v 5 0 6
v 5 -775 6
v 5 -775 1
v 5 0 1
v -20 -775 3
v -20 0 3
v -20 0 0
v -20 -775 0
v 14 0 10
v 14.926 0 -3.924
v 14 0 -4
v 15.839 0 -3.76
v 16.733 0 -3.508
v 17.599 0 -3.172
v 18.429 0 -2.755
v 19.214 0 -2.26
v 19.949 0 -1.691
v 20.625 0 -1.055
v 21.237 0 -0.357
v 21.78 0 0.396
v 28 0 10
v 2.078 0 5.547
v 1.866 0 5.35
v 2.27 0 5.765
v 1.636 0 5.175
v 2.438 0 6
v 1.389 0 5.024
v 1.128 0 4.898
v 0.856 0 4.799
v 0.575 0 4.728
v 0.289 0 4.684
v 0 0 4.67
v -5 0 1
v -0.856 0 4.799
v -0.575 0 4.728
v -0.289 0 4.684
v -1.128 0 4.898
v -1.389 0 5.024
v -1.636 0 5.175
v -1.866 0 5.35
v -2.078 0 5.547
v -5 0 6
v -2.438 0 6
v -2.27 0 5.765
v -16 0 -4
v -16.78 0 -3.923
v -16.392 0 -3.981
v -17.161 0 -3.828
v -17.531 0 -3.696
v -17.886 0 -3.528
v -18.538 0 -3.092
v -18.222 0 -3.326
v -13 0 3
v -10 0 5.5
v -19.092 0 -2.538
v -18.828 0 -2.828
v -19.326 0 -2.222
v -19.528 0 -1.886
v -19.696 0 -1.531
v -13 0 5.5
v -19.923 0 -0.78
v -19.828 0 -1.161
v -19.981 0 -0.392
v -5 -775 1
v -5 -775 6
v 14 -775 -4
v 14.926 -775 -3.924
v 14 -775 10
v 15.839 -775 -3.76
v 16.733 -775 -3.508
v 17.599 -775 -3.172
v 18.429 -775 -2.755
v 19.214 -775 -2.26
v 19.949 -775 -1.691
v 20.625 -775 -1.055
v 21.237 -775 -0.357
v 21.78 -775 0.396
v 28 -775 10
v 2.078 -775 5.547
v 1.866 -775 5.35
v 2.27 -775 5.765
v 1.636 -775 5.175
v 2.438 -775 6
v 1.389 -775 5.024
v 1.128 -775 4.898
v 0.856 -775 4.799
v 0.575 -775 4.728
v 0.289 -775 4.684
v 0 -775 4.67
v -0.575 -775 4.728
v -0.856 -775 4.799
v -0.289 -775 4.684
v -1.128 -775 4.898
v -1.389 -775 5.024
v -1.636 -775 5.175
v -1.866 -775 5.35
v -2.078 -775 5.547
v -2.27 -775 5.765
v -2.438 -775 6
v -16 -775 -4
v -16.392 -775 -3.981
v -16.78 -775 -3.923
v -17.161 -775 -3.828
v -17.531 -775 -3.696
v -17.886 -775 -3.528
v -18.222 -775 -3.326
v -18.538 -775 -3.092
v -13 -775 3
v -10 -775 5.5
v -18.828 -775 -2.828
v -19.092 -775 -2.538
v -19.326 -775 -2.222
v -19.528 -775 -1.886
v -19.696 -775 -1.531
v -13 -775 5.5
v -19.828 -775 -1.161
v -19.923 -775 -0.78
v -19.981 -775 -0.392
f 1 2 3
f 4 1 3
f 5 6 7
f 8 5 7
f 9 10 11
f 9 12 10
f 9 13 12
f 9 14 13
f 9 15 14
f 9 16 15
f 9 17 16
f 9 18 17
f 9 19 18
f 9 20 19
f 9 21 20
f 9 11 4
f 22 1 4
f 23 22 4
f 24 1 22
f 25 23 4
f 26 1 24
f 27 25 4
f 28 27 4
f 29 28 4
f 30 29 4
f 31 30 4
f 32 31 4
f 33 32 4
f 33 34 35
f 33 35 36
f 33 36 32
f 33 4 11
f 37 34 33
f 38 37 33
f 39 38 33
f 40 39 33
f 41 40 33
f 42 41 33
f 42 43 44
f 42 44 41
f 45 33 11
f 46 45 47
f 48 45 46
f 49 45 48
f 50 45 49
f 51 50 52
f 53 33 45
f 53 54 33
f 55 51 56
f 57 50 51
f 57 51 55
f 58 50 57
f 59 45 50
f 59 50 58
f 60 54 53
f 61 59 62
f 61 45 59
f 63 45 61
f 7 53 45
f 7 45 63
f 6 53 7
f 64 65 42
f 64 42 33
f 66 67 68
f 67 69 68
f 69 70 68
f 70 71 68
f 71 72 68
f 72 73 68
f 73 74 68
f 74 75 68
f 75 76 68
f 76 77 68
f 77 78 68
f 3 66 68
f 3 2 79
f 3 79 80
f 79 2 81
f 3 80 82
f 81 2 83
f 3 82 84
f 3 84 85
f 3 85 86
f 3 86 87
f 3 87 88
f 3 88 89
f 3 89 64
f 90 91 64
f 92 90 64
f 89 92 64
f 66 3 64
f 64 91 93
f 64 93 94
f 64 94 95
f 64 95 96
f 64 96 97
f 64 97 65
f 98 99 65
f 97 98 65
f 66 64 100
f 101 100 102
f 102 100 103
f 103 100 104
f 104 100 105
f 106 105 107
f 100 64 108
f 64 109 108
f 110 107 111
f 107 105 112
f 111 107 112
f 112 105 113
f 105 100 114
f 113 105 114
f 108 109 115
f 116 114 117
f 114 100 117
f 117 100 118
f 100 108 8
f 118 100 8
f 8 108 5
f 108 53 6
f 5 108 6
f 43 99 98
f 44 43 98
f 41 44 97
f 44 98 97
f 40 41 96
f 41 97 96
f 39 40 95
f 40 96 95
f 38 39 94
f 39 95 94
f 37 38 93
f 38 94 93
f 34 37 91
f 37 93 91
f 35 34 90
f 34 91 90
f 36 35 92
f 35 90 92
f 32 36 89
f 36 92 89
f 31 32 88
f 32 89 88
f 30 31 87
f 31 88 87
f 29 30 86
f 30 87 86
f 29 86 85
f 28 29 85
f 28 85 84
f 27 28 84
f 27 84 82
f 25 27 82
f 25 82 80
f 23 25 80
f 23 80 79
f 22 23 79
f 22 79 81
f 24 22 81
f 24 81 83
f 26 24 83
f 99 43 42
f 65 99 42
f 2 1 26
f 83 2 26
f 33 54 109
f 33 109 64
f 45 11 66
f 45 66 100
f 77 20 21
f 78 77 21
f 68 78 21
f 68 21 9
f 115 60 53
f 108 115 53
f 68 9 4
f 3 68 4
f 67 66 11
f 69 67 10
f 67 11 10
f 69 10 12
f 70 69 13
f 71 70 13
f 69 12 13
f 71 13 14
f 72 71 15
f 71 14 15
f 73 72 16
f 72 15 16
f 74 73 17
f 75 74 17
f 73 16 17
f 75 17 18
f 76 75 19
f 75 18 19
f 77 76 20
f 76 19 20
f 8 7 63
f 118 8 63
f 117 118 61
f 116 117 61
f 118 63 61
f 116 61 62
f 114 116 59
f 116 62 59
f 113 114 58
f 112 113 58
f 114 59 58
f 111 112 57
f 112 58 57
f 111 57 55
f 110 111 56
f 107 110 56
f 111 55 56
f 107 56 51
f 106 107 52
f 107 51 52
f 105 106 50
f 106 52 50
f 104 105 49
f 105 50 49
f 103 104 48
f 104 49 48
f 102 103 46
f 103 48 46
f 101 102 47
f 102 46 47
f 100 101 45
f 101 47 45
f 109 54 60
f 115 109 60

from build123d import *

# Parameters (mm, degrees)
PAD_DEPTH    = 775
POCKET_DEPTH = 800


with BuildPart() as part:
    # Sketch → Pad (new body)
    with BuildSketch(Plane.XZ):
        with BuildLine():
            Line((14, -4), (-16, -4))
            ThreePointArc((-20, 0), (-18.828427, -2.828427), (-16, -4))
            Line((-20, 3), (-20, 0))
            Line((-13, 3), (-20, 3))
            Line((-13, 5.5), (-13, 3))
            Line((-10, 5.5), (-13, 5.5))
            Line((-10, 5.5), (-5, 1))
            Line((-5, 6), (-5, 1))
            Line((5, 6), (-5, 6))
            Line((5, 6), (5, 1))
            Line((14, 10), (5, 1))
            Line((28, 10), (14, 10))
            Line((21.78, 0.396373), (28, 10))
            ThreePointArc((14, -4), (18.428584, -2.754913), (21.78, 0.396373))
        make_face()
    extrude(amount=PAD_DEPTH)

    # Sketch001 (on Face16 of Pad) → Pocket (cut)
    with BuildSketch(Plane.XZ.offset(775)):
        with BuildLine():
            ThreePointArc((-2.51, 6.117451), (0, 4.67), (2.51, 6.117451))
            Line((-2.51, 6.117451), (2.51, 6.117451))
        make_face()
    extrude(amount=-POCKET_DEPTH, mode=Mode.SUBTRACT)


solid = part.part
